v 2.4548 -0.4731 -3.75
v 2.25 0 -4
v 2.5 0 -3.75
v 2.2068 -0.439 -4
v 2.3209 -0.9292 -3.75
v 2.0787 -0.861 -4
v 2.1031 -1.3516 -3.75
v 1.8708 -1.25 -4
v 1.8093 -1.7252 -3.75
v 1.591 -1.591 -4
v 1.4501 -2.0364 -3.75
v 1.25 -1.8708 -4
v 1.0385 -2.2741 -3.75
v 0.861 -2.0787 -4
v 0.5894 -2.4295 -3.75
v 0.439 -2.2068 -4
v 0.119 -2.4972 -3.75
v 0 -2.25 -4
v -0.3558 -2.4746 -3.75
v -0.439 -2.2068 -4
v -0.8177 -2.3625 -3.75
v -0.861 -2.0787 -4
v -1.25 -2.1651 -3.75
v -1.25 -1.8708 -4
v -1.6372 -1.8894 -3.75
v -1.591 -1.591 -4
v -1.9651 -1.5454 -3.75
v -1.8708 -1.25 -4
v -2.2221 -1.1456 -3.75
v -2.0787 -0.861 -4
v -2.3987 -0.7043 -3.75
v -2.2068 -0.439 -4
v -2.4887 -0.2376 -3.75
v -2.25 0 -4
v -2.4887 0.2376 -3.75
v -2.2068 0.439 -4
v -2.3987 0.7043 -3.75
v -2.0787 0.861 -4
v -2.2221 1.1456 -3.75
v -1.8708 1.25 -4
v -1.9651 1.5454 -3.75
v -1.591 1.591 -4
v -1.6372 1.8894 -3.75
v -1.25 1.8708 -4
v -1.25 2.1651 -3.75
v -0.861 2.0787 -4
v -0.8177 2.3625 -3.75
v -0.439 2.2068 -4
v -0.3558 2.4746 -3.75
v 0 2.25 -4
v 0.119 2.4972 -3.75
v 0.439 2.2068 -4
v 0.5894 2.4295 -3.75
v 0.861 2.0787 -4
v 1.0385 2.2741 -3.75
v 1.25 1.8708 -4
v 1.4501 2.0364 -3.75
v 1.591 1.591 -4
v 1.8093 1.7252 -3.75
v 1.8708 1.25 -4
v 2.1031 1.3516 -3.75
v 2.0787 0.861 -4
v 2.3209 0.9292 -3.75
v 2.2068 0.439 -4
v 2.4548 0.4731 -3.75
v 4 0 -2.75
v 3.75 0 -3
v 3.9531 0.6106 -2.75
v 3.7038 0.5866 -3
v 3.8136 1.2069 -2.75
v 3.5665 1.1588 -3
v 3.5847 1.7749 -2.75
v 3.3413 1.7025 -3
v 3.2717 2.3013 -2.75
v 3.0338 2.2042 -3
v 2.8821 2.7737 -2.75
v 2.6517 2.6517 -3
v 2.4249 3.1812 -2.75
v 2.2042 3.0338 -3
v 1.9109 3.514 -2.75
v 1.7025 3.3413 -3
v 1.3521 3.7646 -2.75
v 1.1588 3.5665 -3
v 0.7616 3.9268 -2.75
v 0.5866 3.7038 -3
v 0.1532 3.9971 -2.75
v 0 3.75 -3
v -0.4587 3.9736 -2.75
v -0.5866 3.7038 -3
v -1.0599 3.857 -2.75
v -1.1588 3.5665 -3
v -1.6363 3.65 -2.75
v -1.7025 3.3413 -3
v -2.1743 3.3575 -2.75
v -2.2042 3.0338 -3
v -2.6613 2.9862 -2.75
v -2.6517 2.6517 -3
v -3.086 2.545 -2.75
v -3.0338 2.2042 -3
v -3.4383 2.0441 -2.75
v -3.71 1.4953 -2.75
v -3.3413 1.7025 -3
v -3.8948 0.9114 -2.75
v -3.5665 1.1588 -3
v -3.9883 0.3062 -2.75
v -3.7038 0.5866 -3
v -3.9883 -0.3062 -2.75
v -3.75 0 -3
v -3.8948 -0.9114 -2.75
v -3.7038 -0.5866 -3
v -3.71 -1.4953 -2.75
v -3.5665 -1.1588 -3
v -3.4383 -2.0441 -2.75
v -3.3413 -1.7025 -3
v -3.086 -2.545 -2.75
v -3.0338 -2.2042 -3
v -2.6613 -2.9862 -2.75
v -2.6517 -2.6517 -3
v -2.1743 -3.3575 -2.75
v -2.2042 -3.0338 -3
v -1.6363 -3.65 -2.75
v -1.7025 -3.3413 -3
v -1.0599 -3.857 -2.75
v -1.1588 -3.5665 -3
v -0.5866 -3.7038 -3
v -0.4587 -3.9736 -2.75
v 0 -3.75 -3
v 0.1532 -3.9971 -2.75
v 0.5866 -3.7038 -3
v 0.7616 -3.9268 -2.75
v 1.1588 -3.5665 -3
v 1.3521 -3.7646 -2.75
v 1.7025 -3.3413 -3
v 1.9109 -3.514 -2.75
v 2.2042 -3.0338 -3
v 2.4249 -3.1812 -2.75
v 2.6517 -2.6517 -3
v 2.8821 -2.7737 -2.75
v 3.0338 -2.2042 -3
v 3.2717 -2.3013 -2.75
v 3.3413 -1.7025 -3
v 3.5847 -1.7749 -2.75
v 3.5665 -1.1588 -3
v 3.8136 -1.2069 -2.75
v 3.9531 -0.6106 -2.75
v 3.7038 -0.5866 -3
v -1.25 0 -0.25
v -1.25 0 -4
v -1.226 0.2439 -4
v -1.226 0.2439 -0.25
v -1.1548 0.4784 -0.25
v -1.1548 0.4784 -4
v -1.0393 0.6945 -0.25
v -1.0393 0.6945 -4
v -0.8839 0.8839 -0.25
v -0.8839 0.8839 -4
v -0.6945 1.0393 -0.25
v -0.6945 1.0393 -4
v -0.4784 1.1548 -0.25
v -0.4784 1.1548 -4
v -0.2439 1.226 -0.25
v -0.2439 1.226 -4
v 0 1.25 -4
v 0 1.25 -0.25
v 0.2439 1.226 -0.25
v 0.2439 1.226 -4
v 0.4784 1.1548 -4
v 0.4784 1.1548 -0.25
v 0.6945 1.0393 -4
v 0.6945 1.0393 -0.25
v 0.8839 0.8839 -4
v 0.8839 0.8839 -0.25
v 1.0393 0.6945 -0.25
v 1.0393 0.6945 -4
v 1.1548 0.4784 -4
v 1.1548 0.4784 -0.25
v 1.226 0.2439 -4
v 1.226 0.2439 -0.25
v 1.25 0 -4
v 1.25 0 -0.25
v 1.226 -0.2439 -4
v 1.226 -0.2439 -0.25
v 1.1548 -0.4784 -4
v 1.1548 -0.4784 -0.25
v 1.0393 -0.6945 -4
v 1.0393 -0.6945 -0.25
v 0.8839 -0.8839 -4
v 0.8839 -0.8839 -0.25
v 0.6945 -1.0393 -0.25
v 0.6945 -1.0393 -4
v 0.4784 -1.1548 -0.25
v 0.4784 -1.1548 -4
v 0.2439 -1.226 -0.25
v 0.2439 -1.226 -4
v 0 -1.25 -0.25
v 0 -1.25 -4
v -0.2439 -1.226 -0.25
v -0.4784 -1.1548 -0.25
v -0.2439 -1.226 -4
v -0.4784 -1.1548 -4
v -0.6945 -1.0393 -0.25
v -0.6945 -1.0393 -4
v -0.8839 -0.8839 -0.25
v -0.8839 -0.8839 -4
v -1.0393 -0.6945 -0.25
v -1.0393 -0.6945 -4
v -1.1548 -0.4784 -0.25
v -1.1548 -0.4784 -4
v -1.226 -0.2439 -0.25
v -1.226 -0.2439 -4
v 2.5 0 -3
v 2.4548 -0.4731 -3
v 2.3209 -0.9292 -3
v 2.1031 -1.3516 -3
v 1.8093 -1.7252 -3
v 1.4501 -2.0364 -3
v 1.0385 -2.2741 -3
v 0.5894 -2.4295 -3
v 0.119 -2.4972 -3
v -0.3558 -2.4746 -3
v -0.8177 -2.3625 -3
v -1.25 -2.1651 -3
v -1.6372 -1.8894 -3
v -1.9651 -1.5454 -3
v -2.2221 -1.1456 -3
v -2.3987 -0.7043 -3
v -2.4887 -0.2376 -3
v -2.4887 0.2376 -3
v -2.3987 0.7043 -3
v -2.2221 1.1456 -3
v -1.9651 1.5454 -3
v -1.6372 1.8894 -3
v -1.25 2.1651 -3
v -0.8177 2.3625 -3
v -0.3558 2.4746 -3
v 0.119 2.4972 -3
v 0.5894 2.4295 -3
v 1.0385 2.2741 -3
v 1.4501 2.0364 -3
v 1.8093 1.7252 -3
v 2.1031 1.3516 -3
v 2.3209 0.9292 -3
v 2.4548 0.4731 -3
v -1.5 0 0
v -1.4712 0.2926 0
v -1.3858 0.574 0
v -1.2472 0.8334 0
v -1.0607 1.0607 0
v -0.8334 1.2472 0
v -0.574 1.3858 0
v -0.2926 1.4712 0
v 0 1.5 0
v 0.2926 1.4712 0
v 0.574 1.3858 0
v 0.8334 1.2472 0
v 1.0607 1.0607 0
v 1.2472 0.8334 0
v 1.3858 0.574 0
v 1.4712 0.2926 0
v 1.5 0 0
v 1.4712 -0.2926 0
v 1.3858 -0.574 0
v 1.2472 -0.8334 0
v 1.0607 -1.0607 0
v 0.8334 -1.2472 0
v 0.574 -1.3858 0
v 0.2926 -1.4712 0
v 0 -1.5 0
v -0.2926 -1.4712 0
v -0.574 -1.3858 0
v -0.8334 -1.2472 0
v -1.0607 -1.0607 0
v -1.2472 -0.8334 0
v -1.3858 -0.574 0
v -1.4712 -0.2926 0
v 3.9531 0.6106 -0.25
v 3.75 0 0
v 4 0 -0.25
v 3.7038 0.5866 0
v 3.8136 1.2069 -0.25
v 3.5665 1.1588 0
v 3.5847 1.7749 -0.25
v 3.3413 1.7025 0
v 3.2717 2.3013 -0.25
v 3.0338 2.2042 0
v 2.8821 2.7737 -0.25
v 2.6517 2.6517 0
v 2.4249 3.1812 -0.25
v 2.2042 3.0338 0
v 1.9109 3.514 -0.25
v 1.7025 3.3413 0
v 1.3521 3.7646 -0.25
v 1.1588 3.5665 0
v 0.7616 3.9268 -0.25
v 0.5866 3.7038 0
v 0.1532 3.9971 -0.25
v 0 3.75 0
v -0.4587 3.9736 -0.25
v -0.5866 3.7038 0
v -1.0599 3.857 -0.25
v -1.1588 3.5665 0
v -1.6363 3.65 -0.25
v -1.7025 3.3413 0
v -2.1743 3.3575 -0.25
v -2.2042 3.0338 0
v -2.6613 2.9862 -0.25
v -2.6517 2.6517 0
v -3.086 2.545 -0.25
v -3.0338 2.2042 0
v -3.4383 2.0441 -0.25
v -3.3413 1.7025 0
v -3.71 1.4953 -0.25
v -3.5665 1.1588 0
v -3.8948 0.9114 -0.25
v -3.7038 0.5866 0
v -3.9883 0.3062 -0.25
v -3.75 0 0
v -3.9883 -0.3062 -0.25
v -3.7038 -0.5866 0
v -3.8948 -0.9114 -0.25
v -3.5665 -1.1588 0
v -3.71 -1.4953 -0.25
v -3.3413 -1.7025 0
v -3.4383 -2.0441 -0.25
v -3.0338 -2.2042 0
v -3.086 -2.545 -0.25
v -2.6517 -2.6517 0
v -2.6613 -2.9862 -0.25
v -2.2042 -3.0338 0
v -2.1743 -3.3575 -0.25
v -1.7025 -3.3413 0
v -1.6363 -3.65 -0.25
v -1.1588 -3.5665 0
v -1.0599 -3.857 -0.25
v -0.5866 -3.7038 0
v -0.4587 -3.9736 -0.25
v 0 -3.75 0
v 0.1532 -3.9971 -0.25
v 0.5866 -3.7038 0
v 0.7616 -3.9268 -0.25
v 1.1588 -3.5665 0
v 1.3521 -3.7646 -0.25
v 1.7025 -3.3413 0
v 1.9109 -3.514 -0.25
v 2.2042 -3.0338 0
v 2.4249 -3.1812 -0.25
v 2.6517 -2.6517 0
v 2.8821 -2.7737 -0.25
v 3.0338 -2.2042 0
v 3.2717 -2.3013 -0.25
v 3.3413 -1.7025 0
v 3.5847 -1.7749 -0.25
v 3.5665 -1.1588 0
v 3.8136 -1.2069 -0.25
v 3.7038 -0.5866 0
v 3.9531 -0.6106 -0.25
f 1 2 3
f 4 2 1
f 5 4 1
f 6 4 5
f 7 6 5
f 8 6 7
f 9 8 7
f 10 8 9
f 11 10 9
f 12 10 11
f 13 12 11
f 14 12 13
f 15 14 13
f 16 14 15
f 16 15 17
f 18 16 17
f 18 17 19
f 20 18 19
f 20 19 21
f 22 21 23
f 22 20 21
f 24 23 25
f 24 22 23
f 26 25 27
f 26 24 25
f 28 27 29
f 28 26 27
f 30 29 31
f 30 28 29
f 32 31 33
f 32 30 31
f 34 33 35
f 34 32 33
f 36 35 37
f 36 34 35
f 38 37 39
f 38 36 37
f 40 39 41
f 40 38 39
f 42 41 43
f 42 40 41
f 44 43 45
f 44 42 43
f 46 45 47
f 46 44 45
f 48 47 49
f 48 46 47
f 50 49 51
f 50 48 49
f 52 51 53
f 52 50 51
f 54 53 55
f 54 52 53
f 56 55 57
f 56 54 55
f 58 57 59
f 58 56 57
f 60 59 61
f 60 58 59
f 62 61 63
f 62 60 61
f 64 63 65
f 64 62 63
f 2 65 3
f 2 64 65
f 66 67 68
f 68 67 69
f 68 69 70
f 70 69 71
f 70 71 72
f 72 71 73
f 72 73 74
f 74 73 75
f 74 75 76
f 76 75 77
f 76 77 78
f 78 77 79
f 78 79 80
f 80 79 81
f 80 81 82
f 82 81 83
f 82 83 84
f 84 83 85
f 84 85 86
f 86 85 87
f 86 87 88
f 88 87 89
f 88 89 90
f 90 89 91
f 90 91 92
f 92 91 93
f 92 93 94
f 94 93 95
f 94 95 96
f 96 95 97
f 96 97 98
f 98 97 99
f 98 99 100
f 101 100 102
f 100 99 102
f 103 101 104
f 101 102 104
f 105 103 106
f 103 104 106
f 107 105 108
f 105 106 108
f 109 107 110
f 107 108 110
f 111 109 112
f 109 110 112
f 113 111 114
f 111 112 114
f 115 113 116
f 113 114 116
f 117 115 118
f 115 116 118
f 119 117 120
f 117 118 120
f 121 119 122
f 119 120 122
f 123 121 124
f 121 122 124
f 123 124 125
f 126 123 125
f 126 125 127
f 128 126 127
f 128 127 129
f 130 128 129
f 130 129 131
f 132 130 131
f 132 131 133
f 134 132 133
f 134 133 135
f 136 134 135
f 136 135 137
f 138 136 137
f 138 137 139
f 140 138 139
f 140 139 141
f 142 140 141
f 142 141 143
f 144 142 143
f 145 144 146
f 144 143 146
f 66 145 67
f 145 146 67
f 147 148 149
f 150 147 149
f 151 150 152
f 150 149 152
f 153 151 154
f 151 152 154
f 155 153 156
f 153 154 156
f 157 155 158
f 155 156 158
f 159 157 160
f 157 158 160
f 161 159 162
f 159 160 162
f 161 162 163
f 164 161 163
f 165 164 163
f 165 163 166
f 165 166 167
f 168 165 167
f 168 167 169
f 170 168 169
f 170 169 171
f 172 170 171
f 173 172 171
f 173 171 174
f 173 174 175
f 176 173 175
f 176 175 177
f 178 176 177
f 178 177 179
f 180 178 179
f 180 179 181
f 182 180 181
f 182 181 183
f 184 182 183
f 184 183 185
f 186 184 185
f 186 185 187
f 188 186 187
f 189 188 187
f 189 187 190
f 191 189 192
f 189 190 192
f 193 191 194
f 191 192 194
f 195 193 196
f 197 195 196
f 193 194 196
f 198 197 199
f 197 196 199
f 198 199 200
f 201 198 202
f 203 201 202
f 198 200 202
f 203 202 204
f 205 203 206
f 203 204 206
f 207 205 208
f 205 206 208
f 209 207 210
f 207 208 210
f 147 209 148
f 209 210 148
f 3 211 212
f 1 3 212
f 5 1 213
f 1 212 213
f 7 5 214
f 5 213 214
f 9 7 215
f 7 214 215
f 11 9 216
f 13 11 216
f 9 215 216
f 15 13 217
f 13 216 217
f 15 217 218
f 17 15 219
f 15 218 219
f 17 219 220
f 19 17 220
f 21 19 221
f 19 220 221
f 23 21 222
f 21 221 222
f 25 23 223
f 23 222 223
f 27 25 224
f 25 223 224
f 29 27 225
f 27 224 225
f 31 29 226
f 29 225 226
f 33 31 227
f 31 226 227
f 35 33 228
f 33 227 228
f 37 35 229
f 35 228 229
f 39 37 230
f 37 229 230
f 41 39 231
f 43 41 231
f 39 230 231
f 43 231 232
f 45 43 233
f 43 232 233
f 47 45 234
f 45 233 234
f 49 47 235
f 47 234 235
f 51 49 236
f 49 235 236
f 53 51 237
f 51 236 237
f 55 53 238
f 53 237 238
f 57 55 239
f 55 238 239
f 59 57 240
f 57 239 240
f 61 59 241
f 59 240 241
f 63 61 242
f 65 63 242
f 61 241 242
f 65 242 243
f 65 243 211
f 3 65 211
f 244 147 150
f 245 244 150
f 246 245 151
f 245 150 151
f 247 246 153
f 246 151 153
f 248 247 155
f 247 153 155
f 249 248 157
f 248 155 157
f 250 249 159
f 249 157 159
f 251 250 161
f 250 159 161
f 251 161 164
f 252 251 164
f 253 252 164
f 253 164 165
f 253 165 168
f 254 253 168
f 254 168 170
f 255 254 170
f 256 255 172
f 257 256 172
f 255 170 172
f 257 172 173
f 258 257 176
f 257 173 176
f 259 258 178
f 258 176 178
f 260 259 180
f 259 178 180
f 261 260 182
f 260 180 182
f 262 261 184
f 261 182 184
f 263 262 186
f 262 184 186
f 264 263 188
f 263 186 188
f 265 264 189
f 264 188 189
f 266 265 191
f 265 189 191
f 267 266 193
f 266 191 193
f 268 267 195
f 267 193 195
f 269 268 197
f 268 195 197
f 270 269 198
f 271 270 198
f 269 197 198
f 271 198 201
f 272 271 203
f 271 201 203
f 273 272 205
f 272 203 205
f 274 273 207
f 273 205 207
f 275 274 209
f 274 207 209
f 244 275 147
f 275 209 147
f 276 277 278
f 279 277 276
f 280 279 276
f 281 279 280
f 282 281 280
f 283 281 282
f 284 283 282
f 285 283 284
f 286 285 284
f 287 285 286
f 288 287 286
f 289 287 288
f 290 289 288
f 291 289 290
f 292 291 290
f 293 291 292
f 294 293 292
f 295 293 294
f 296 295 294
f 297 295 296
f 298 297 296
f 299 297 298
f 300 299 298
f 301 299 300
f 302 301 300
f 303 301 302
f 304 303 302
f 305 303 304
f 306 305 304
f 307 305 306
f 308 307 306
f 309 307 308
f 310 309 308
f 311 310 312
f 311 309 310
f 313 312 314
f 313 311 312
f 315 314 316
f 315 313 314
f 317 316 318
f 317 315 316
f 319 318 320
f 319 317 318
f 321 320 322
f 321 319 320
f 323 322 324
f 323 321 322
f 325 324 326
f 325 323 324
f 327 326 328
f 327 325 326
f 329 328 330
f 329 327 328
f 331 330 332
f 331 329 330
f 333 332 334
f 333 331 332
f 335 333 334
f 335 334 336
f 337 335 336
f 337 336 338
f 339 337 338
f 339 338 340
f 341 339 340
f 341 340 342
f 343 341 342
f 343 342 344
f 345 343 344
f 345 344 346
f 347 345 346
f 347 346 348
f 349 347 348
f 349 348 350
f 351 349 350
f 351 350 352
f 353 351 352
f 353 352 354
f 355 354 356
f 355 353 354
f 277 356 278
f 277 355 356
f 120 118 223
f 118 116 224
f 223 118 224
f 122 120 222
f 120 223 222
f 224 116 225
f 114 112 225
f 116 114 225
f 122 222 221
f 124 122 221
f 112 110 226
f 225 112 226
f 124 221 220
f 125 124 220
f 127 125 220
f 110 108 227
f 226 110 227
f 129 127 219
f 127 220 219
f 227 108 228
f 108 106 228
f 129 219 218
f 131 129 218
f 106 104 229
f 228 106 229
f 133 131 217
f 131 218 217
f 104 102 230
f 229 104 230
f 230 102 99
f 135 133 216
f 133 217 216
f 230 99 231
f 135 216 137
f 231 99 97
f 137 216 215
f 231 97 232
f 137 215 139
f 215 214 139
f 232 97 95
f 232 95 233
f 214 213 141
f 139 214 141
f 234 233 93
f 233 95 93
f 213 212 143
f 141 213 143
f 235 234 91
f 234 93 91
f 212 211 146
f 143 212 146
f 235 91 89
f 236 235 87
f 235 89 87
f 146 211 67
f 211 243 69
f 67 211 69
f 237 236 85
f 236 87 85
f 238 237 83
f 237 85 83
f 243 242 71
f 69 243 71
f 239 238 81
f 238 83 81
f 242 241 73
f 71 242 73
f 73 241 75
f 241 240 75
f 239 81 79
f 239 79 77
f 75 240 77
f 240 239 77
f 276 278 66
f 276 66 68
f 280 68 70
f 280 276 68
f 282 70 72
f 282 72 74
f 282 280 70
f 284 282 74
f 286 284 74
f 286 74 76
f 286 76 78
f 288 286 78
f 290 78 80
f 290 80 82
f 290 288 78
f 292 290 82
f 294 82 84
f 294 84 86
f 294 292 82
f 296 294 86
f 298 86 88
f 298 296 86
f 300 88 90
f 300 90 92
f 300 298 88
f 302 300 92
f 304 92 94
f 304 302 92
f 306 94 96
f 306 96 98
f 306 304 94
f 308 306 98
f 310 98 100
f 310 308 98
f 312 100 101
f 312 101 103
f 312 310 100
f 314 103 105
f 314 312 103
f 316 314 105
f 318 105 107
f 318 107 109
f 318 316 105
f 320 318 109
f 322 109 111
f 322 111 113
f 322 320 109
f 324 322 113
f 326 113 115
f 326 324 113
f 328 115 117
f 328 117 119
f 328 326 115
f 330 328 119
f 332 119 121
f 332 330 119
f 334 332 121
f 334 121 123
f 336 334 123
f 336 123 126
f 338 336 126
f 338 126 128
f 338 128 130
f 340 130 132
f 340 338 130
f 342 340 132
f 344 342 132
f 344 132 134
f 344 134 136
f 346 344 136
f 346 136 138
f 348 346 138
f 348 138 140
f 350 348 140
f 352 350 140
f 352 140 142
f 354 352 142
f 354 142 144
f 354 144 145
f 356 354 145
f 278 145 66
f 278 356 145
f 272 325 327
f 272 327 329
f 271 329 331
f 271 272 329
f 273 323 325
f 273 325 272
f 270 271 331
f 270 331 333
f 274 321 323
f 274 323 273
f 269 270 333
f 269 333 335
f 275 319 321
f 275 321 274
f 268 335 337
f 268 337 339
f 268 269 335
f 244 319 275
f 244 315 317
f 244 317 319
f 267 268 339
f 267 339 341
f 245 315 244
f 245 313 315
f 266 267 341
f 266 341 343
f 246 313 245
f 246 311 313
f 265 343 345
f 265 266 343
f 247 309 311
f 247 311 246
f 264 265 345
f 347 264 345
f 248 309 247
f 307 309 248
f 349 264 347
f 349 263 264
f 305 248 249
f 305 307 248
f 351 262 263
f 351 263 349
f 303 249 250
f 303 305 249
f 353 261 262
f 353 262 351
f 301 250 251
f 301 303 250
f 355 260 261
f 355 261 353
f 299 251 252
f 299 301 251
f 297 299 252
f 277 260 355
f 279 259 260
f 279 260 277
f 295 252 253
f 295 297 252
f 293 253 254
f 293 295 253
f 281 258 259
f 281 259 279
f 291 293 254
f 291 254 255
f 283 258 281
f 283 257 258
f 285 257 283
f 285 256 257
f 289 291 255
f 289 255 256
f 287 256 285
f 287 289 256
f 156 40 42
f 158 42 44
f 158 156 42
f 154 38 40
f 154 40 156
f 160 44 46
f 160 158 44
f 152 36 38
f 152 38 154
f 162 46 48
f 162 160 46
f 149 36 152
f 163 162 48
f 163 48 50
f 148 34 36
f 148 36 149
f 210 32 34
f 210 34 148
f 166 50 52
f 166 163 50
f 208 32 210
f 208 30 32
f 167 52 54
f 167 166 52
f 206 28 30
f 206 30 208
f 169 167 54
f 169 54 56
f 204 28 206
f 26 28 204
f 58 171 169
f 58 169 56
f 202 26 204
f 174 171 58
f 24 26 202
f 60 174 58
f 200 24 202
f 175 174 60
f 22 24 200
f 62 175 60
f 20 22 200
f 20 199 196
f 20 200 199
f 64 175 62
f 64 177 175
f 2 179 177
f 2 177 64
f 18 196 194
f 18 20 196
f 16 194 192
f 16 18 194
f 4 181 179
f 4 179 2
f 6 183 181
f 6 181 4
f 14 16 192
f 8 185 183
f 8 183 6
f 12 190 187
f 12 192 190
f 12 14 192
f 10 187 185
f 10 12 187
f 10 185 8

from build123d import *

# Parameters (mm, degrees)
F0_R     = 4
F1_DEPTH = 3
F2_R     = 2.5
F3_DEPTH = 1
F5_D     = 2.5
F6_SIZE  = 0.25


with BuildPart() as f1:
    # F0 (on Top) → F1 (new body)
    with BuildSketch(Plane.XY):
        Circle(F0_R)
    extrude(amount=-F1_DEPTH)

    # F2 (on face) → F3 (join)
    with BuildSketch(Plane(origin=(0, 0, -3), x_dir=(1, 0, 0), z_dir=(0, 0, -1))):
        Circle(F2_R)
    extrude(amount=F3_DEPTH)

    # F5 (through all)
    with Locations(Plane.XY):
        with Locations((0, 0)):
            Hole(F5_D / 2)

    # F6
    f6_edges = [f1.edges().sort_by_distance(p)[0] for p in [
        (-4, 0, 0),
        (-4, 0, -3),
        (-2.5, 0, -4),
        (-1.25, 0, 0),
    ]]
    chamfer(f6_edges, length=F6_SIZE)


solid = f1.part
